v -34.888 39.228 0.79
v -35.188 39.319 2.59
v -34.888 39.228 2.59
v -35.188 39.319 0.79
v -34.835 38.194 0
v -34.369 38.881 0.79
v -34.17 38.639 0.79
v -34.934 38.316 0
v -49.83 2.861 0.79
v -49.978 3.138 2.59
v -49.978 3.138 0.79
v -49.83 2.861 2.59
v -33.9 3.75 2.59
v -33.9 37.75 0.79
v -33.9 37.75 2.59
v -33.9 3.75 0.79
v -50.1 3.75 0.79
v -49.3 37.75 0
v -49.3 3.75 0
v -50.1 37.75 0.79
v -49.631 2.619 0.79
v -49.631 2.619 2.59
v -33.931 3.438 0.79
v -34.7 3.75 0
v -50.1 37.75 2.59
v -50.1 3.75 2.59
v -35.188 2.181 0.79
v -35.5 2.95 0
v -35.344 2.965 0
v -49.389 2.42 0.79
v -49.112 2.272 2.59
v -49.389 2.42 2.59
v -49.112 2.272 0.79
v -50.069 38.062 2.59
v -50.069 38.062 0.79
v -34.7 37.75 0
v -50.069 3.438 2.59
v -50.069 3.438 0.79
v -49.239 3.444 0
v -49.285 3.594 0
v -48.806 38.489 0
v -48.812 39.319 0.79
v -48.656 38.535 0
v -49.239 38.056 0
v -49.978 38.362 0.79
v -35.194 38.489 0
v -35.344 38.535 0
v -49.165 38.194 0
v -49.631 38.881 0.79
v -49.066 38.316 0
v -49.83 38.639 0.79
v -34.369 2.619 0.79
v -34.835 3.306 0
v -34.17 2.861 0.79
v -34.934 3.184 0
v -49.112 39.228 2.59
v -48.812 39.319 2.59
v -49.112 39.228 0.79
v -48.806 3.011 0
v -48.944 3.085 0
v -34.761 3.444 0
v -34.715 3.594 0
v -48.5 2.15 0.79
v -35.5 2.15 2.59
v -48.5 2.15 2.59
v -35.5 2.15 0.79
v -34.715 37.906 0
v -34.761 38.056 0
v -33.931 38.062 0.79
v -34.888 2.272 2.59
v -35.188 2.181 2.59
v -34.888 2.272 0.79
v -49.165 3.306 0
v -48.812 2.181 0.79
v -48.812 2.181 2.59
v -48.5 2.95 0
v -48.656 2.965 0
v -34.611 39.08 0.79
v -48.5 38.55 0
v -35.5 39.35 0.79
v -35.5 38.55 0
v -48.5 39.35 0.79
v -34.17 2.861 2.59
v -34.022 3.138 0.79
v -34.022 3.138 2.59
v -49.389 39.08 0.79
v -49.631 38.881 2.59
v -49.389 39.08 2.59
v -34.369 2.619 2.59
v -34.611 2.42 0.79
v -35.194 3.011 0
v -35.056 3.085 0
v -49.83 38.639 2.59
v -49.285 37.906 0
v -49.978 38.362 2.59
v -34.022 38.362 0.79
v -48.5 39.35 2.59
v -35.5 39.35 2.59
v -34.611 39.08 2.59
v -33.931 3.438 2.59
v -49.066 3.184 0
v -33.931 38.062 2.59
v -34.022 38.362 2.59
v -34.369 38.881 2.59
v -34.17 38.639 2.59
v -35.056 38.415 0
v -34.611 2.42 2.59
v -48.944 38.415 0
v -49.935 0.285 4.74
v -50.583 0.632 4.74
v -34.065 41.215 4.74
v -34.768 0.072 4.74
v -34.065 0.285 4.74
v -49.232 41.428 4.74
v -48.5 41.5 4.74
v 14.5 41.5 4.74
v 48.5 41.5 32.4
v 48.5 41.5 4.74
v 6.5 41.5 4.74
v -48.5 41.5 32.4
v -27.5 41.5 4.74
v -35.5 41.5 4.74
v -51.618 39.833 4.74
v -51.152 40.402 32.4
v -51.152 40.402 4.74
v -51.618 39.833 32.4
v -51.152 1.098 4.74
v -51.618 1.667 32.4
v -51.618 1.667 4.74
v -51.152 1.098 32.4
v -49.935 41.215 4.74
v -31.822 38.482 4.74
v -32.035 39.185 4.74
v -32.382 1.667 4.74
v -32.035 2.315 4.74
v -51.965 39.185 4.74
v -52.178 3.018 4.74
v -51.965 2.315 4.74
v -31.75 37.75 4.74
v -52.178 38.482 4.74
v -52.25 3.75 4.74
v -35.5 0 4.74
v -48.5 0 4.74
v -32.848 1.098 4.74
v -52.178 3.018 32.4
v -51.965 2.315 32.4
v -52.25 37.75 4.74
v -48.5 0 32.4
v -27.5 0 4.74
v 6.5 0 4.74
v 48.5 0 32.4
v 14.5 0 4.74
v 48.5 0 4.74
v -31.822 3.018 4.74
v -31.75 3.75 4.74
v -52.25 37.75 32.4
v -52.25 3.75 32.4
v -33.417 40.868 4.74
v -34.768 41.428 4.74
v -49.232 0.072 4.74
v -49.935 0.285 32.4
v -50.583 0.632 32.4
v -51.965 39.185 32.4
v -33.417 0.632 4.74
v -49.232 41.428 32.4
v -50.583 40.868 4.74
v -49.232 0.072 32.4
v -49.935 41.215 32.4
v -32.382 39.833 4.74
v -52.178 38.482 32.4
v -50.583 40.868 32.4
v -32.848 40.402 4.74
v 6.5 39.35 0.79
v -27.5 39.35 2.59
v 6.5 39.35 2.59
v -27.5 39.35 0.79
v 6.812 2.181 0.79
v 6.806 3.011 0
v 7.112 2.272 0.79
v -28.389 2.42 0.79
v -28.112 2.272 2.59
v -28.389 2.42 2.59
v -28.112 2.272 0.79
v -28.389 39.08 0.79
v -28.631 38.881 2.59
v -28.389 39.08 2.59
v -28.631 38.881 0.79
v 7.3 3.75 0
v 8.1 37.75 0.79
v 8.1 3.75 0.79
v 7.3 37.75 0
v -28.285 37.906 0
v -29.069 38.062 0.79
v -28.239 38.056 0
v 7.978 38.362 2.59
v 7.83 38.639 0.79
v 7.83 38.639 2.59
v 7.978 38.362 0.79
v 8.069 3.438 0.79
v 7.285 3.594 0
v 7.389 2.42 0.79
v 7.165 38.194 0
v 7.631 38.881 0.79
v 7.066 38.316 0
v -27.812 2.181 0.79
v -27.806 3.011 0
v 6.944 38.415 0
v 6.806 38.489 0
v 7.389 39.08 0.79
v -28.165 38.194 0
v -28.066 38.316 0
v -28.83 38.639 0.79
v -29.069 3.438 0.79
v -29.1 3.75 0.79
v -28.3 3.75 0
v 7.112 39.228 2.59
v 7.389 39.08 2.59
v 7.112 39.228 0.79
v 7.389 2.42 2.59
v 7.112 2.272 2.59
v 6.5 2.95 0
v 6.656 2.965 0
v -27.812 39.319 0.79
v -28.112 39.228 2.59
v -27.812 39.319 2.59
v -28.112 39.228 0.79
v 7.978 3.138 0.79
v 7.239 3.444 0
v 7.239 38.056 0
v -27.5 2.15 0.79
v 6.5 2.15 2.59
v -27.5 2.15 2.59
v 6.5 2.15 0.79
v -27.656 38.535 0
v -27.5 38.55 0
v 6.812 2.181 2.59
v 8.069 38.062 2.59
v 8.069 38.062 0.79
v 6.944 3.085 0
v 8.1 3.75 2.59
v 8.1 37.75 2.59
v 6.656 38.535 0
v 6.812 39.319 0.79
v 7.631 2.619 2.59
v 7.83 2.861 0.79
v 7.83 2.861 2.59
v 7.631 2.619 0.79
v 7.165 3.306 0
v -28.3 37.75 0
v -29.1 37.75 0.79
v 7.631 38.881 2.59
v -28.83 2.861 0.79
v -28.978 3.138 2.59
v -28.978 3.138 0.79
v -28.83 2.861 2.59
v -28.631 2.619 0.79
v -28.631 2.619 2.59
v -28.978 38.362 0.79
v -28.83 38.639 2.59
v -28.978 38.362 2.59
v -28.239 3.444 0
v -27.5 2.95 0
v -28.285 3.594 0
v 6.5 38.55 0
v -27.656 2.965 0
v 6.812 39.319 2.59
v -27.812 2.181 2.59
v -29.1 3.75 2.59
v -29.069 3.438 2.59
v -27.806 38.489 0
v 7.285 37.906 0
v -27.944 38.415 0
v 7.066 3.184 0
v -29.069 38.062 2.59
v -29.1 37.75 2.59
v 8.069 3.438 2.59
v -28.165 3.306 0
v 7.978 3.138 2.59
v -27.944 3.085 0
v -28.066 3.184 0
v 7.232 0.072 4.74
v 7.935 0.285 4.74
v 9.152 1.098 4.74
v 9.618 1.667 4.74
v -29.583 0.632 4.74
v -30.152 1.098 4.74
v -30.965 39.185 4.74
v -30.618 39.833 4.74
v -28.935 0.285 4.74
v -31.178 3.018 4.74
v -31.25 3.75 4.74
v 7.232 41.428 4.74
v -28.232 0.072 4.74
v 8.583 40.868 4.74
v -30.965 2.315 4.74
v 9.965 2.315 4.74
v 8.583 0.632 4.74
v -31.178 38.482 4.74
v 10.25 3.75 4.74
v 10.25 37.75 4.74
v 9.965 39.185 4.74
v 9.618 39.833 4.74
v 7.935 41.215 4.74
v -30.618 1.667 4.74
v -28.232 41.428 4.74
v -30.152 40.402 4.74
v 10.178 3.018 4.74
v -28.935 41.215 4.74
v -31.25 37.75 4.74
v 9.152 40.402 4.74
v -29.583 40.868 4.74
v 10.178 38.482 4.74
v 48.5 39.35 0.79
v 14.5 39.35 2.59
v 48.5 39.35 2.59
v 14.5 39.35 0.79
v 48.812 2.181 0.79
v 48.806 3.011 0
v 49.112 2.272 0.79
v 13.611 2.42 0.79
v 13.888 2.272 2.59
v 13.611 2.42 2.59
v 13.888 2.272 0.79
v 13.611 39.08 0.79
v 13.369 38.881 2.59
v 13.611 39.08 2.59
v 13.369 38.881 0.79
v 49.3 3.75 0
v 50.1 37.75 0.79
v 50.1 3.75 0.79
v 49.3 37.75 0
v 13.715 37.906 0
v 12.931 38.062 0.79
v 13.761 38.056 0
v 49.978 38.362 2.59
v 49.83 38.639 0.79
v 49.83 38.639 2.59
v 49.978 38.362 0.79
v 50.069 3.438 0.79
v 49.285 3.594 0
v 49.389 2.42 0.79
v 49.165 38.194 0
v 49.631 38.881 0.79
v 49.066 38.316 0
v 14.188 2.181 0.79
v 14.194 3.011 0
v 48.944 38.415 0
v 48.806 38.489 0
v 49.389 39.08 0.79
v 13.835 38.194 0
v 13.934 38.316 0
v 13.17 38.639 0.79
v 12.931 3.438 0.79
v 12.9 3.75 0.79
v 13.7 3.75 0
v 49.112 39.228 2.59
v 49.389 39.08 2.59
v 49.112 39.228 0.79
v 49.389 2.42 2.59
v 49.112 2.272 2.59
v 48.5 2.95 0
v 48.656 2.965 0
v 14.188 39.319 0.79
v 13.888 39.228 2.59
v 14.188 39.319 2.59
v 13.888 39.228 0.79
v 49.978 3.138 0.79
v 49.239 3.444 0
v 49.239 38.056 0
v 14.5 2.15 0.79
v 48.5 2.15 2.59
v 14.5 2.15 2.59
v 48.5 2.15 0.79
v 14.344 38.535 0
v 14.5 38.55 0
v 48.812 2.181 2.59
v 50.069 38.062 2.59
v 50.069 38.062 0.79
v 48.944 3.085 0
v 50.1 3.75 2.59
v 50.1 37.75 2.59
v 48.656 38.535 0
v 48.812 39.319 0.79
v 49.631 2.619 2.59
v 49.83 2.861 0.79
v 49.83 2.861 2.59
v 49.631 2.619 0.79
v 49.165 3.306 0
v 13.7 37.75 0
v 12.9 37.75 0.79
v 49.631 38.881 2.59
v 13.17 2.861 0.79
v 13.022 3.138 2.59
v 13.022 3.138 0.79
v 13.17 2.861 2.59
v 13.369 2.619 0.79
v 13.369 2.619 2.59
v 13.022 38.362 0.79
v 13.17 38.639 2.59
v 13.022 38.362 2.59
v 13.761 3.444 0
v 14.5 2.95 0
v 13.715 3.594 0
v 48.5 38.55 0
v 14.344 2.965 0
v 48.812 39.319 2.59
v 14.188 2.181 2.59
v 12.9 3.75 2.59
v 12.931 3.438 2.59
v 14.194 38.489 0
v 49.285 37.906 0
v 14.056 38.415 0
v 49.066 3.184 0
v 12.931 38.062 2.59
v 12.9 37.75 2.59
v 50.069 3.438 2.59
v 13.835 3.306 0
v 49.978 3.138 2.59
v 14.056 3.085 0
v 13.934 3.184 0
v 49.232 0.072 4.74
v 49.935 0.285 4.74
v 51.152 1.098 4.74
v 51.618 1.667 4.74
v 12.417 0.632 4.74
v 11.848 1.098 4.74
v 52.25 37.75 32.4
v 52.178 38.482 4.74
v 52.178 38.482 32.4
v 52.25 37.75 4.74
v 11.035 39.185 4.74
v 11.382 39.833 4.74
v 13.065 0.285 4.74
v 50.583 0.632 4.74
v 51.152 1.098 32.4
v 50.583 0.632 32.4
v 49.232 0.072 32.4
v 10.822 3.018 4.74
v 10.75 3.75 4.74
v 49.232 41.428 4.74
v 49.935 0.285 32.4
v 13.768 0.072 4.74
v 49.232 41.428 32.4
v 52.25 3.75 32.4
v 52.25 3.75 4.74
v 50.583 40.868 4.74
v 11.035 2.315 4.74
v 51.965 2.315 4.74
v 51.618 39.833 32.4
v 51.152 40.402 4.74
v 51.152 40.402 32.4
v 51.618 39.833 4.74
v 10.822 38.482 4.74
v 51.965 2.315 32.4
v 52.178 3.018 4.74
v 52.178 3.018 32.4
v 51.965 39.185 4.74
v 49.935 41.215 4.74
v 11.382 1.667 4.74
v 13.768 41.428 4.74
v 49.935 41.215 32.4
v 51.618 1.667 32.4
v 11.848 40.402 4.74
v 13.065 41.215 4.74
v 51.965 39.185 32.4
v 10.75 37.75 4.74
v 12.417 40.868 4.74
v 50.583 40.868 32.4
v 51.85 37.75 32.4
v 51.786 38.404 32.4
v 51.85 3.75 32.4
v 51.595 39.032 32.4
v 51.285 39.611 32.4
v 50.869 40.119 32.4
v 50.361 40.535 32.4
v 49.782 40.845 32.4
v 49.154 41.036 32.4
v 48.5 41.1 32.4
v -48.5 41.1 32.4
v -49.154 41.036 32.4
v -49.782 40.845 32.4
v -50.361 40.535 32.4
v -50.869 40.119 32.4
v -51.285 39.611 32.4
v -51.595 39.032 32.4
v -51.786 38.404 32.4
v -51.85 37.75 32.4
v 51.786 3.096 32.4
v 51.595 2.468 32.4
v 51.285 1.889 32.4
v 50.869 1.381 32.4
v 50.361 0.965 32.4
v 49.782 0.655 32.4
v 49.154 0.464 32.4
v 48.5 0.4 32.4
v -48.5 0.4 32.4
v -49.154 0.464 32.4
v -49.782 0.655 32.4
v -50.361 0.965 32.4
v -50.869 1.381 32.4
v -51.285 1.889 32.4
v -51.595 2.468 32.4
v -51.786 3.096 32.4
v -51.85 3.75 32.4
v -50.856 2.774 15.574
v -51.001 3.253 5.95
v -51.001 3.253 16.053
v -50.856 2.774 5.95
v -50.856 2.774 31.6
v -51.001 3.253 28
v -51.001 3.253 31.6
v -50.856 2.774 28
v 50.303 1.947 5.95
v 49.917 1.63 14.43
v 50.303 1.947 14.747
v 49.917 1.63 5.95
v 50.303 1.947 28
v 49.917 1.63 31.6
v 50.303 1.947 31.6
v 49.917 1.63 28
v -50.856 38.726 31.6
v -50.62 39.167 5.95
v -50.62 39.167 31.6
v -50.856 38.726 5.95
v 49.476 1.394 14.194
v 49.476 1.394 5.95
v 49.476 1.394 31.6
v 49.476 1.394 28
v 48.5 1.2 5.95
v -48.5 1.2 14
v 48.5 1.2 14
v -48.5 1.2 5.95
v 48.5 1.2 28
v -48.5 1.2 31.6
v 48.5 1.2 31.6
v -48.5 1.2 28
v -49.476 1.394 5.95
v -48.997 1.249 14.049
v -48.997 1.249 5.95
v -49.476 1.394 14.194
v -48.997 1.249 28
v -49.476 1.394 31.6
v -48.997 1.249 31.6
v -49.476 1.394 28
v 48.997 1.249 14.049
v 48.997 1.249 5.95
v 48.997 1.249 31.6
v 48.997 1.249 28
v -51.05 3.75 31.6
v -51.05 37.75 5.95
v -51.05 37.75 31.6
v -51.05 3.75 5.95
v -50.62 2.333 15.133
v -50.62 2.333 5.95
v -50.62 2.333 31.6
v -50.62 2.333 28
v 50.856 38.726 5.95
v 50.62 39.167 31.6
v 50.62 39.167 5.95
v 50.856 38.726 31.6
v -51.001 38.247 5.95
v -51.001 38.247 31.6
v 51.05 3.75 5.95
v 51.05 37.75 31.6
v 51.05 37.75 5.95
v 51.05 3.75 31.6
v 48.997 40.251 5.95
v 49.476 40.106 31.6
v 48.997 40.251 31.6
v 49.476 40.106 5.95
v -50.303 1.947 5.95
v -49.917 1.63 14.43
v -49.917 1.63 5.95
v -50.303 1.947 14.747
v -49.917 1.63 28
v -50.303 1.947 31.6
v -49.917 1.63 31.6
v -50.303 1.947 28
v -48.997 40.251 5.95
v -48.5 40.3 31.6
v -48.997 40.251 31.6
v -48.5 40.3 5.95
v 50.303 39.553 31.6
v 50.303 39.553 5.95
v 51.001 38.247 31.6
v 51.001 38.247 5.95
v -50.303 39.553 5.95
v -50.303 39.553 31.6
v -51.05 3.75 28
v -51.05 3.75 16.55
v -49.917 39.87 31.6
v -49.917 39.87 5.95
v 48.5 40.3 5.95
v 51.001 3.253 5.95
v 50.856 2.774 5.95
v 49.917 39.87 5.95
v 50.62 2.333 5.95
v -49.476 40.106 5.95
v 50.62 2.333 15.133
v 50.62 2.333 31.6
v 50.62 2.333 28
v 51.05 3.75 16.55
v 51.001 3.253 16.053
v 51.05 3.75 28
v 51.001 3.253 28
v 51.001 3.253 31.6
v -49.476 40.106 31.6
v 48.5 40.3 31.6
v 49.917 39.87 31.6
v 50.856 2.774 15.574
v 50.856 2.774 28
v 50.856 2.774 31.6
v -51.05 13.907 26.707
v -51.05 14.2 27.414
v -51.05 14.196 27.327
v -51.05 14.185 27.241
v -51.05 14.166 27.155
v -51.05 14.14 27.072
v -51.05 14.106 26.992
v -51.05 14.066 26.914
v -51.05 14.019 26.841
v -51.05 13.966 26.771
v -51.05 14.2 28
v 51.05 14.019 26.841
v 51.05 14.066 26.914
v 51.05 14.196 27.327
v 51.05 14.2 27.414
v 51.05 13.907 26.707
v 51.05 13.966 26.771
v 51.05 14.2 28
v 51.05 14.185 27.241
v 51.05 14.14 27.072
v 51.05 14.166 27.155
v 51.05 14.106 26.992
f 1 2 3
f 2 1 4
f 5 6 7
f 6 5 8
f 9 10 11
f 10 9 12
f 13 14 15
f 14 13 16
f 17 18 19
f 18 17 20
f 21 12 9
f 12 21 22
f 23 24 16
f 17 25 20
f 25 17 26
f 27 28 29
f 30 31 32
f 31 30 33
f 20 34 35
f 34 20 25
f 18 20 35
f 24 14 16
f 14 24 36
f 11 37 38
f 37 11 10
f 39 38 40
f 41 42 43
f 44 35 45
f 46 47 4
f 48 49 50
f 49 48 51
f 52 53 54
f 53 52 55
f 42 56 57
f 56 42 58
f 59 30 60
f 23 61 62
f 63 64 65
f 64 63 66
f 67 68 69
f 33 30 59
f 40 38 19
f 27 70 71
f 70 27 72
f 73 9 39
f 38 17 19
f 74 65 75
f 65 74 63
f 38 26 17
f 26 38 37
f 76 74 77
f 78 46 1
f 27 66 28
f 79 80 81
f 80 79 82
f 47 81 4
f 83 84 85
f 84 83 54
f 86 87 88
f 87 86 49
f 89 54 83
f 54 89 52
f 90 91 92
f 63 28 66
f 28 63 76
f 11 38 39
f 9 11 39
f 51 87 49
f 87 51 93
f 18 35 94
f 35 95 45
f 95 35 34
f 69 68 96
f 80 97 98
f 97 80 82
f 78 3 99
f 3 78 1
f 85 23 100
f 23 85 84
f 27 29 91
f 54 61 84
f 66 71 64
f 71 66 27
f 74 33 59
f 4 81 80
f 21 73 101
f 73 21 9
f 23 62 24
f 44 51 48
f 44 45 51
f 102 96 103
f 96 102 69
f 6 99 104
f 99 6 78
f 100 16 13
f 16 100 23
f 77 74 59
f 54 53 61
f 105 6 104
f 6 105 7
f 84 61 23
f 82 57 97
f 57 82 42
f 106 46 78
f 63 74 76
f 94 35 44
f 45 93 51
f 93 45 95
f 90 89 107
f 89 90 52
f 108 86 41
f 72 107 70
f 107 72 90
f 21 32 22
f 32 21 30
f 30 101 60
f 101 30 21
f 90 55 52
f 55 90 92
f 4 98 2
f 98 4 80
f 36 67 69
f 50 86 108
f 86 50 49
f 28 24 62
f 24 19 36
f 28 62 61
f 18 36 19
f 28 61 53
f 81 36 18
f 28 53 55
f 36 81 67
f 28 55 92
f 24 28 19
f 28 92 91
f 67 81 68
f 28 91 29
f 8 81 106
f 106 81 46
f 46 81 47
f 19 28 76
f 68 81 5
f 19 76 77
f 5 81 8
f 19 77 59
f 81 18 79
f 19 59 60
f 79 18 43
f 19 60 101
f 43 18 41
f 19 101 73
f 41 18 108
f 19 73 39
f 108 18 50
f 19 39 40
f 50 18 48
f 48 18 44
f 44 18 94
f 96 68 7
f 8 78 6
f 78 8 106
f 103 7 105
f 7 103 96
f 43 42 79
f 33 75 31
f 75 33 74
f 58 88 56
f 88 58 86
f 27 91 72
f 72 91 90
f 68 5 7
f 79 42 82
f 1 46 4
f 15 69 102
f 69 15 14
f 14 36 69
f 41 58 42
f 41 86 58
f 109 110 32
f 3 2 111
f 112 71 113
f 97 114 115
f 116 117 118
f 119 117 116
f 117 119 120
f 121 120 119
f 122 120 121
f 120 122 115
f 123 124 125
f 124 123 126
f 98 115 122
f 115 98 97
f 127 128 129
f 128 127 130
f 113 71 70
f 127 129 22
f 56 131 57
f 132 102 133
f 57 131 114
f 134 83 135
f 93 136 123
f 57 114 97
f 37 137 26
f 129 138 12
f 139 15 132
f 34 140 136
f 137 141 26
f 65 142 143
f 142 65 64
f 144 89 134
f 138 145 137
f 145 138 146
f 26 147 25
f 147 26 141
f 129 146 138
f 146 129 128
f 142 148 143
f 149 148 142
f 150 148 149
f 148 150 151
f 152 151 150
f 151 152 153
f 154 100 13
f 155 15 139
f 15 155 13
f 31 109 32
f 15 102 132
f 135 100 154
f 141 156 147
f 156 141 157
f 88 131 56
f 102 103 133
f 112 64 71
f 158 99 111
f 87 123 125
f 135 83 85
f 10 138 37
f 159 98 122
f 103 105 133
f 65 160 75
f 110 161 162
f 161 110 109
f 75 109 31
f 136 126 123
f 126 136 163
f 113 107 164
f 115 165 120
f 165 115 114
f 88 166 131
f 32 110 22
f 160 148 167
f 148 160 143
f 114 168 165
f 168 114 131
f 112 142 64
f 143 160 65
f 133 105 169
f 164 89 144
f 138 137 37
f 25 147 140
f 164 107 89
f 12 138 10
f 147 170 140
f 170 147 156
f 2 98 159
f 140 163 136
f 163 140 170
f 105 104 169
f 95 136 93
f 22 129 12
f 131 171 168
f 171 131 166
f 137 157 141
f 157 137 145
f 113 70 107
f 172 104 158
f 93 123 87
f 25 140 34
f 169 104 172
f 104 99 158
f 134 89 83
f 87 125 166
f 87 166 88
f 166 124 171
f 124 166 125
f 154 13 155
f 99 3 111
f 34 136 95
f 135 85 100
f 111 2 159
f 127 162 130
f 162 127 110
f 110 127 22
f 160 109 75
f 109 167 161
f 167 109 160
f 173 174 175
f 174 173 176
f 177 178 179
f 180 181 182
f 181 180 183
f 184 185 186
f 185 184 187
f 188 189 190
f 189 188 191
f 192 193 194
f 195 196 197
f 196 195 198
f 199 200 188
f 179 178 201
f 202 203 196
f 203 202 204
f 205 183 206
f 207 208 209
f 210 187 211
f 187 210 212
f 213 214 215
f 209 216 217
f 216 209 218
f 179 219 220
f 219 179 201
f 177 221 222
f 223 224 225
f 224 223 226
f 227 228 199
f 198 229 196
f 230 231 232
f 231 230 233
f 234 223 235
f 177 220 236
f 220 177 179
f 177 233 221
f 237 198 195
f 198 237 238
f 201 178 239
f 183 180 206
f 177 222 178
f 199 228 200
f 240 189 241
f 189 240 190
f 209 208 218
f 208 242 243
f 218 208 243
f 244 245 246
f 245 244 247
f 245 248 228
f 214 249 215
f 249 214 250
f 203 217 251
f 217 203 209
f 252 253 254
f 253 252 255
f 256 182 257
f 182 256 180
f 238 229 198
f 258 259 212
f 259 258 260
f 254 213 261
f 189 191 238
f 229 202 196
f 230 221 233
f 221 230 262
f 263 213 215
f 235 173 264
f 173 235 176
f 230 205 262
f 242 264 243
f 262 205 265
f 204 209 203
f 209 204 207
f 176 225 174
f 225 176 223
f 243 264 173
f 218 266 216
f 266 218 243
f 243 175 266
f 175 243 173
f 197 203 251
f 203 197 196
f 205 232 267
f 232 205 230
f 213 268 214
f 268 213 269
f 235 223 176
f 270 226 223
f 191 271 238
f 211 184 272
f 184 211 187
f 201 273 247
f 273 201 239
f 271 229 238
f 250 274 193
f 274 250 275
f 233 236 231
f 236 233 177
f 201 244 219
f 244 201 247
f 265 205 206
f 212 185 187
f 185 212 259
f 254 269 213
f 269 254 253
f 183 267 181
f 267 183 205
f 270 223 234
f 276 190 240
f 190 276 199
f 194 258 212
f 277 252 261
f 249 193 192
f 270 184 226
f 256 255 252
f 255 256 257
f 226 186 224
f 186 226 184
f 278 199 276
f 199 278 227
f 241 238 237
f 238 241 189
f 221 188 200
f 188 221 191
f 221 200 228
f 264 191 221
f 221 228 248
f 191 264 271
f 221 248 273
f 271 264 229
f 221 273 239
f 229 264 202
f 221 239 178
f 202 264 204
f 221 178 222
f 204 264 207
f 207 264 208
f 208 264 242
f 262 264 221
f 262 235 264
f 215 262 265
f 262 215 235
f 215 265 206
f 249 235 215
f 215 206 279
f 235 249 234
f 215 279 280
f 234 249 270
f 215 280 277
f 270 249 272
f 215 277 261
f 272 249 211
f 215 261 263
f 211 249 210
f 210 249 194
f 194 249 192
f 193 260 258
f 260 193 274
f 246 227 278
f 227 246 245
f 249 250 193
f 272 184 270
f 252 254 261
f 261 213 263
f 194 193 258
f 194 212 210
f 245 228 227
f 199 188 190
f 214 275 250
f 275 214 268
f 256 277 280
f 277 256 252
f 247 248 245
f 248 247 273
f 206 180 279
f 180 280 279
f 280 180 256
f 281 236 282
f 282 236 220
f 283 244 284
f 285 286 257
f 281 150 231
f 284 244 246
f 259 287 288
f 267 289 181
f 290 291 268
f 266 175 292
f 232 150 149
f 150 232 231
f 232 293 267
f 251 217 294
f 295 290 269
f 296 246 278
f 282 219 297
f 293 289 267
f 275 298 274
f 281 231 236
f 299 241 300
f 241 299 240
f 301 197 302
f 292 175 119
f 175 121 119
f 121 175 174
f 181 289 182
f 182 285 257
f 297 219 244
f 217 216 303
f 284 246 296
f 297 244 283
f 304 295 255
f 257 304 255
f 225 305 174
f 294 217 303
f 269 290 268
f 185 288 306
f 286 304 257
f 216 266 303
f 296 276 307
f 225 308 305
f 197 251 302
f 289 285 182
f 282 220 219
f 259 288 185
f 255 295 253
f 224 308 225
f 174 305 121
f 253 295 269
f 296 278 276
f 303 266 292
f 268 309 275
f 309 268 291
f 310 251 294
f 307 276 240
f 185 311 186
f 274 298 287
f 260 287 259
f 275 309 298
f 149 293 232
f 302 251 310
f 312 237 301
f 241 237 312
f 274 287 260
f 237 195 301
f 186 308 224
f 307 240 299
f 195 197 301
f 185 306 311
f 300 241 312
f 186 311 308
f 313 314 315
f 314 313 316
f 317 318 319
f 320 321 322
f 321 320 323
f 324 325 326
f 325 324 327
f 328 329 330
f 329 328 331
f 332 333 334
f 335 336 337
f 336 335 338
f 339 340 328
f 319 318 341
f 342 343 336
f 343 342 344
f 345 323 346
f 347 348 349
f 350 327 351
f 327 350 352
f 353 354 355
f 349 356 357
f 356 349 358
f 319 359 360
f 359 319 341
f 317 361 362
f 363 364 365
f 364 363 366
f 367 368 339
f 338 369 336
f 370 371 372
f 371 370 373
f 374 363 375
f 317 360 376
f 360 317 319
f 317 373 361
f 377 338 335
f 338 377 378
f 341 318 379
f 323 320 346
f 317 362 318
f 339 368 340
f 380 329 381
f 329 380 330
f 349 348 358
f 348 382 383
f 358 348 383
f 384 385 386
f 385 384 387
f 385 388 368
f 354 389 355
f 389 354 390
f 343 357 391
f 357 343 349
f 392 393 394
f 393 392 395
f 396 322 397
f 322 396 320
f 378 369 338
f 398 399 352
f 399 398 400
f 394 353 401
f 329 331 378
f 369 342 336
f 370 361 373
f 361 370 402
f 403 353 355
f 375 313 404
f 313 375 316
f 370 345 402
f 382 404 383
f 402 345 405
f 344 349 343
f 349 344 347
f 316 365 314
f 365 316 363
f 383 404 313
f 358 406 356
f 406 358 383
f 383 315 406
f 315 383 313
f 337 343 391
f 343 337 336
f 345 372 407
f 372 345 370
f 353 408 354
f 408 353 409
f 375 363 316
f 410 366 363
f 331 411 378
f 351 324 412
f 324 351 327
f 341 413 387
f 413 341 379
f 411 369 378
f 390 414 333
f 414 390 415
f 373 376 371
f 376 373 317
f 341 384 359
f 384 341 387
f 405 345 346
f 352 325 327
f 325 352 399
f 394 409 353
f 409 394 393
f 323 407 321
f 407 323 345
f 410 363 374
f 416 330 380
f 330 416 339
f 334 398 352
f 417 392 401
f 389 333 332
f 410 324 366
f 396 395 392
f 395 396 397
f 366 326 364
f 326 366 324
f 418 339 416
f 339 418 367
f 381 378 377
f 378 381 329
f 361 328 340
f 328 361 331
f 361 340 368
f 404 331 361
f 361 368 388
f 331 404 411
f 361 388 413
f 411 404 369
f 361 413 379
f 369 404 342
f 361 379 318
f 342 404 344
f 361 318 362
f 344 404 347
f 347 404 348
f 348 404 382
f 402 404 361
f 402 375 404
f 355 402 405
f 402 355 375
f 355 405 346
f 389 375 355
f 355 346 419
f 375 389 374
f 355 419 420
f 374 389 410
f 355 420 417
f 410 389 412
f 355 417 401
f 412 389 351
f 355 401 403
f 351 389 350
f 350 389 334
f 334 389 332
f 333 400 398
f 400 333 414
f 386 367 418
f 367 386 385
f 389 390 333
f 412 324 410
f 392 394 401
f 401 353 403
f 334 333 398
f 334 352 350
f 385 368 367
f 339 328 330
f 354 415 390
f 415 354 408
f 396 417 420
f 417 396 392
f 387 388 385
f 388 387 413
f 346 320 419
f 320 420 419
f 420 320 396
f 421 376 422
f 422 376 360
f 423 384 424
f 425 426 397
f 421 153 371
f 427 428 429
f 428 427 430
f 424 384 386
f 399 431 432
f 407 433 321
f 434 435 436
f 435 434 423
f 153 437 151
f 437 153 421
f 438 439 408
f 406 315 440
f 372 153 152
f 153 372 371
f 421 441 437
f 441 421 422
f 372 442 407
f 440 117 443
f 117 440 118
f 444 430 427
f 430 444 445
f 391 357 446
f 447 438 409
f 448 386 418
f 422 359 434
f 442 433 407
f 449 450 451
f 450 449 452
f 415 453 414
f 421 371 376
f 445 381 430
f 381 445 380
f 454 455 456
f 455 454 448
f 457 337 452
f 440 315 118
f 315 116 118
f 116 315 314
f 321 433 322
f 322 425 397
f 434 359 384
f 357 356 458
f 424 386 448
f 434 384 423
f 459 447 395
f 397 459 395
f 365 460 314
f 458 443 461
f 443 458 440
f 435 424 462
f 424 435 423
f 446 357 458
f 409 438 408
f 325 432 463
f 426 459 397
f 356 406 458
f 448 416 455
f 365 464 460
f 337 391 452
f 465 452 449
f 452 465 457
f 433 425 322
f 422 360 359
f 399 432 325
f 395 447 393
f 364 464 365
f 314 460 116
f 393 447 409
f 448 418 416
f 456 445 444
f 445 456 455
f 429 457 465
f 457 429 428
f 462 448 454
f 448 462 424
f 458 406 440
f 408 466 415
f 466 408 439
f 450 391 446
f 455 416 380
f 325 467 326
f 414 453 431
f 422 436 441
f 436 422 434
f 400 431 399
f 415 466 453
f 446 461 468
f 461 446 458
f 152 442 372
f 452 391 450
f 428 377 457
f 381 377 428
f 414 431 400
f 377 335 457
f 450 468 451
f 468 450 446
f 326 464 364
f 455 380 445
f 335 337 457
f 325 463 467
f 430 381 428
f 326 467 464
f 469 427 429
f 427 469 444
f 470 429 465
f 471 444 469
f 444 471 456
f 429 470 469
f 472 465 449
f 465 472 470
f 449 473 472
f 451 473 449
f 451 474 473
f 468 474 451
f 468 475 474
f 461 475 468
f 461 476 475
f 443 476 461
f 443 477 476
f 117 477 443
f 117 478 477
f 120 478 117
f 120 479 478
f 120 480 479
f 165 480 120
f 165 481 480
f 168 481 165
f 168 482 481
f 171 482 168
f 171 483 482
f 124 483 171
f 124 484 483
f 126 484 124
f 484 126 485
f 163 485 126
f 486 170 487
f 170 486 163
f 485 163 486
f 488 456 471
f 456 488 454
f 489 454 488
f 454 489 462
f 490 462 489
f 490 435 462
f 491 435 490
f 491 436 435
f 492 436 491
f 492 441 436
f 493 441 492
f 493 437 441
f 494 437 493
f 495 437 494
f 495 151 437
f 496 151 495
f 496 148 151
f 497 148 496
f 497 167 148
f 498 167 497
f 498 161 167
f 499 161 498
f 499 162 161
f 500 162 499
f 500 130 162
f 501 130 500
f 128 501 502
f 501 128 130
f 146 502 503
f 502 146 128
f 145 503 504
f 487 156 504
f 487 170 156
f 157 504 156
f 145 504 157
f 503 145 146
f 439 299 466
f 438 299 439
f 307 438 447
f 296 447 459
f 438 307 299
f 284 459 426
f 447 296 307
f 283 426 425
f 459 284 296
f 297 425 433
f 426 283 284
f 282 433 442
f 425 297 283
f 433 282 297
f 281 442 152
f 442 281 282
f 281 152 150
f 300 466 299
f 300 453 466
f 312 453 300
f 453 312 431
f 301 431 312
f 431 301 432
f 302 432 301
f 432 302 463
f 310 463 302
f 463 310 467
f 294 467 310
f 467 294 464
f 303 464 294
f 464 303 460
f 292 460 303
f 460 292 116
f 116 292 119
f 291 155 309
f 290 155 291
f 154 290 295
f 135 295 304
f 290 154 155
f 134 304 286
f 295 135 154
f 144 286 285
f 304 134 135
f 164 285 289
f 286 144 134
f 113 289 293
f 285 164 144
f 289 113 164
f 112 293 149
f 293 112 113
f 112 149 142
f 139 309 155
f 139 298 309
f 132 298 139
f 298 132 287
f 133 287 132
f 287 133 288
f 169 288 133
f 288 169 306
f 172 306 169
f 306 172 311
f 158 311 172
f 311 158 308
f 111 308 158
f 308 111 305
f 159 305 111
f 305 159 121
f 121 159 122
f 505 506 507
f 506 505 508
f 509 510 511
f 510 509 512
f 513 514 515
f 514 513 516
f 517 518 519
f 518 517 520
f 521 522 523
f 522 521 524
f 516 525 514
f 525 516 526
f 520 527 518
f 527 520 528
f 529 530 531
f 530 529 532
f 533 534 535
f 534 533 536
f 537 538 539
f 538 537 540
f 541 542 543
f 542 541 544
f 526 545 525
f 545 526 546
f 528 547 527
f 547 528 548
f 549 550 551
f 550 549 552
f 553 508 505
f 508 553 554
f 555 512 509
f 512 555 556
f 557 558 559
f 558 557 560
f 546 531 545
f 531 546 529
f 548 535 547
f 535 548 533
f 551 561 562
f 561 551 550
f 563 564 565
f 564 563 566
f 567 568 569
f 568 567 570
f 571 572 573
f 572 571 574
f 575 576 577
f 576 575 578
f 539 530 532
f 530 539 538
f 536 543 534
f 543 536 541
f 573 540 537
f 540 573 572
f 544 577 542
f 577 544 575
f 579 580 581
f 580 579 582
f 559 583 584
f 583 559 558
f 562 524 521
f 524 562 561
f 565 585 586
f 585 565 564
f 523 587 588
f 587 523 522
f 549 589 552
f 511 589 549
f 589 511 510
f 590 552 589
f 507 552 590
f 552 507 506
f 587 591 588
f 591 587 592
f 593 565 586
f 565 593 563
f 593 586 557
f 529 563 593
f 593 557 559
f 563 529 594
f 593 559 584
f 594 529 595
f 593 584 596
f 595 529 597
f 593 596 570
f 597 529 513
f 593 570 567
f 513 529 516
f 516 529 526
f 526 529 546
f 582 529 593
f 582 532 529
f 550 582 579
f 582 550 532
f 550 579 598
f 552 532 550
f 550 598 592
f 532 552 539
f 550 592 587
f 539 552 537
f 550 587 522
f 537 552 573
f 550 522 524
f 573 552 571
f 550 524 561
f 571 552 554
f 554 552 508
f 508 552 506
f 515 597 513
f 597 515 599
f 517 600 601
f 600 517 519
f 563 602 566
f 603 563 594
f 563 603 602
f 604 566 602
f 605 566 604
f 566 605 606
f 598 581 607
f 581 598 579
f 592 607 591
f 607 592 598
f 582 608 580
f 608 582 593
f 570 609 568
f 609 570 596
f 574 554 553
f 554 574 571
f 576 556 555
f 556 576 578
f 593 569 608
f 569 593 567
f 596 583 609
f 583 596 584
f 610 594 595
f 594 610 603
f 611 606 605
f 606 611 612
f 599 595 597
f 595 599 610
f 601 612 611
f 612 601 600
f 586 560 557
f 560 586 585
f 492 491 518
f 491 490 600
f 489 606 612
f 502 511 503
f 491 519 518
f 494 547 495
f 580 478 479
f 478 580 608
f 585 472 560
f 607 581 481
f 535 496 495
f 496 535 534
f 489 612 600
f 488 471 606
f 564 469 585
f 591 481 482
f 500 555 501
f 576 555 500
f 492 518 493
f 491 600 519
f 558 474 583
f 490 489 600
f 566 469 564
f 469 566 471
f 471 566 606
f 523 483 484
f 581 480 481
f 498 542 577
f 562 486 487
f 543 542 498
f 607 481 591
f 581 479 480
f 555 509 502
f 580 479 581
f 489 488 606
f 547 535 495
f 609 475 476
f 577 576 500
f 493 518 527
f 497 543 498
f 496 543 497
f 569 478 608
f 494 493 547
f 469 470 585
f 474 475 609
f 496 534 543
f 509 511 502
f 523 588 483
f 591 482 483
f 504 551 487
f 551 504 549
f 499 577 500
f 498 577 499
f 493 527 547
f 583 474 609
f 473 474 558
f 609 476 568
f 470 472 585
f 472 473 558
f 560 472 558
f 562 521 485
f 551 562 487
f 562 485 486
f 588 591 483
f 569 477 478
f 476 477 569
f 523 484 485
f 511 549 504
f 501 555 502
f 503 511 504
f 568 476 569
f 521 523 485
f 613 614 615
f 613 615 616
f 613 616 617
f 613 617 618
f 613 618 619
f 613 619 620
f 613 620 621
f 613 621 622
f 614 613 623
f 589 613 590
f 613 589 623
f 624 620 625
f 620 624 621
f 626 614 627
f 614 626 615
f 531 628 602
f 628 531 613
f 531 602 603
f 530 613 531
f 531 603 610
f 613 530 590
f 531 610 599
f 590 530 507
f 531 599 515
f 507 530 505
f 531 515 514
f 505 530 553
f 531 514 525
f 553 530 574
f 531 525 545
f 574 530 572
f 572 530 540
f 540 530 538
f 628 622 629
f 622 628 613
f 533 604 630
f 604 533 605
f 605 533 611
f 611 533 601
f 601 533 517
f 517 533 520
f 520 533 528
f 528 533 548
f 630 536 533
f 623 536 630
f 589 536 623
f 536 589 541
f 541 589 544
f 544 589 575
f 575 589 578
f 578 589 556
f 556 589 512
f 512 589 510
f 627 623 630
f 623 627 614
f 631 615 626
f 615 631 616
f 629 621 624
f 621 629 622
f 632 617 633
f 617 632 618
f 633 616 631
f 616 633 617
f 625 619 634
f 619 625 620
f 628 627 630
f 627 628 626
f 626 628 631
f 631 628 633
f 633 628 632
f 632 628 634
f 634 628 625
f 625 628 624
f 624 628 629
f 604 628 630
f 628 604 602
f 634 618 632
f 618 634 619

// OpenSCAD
// file: ../../../modules/gridfinity.scad
// Gridfinity ベースプレートの共有 module。
// 寸法は Gridfinity 仕様 (Zack Freedman) の baseplate 輪郭に従う:
//   ピッチ 42、ソケット上端開口 41.5 (角 R4)、上から 45° 面取り 2.15 →
//   垂直 1.8 (37.2 角・R1.85) → 45° 面取り 0.7 → 底 35.8 角 (R1.15)。
//   ソケット深さ = 2.15 + 1.8 + 0.7 = 4.65。
//
// 座標系: X が列方向 (中央が 0)、Y が行方向 (板の前端が 0)、Z=0 が板の底面。
// 板の外形は grid とは独立に rim で与えるので、grid より大きい板 (縁付き) を
// 作れる。ソケットは rim=[left, right, front, back] の内側へ 42 ピッチで並ぶ。

gf_pitch = 42;
gf_socket_top = 41.5; // 上端開口
gf_socket_mid = 37.2; // 垂直部
gf_socket_bot = 35.8; // 底
gf_socket_r_top = 4;
gf_socket_r_mid = 1.85;
gf_socket_r_bot = 1.15;
gf_chamfer_top = 2.15;
gf_wall_h = 1.8;
gf_chamfer_bot = 0.7;
gf_socket_depth = gf_chamfer_top + gf_wall_h + gf_chamfer_bot; // 4.65
gf_fn = 32;
gf_eps = 0.01; // hull 用の薄板の厚さ
gf_over = 0.5; // 切削の抜き代

// 角丸正方形または矩形 (w は一辺、または [幅, 奥行き]、角 R)
module
gf_rounded_square(w, r)
{
    offset(r = r, $fn = gf_fn)
        square(is_list(w) ? w - [ 2 * r, 2 * r ] : w - 2 * r, center = true);
}

// 厚さ gf_eps の角丸正方形の薄板を z に置く (hull の骨)
module
gf_slab(w, r, z)
{
    translate([ 0, 0, z ]) linear_extrude(gf_eps) gf_rounded_square(w, r);
}

// ソケット1個の切削体。z=0 がソケットの底 (床の天面)、+Z へ 4.65 で天面に出る。
// clearance は嵌合の逃げで、輪郭を全周へ clearance だけ外へ出す (幅 +2c、角 R
// +c)。pitch_x は X 方向のセル幅。端数でも角 R と面取りの寸法を保つ。
module
gf_socket_cut(clearance = 0, pitch_x = gf_pitch)
{
    z1 = gf_chamfer_bot;
    z2 = z1 + gf_wall_h;
    z3 = gf_socket_depth;
    c = clearance;
    assert(pitch_x > gf_pitch - gf_socket_top + 2 * gf_socket_r_top,
           "Cell width is too small for the socket corner radius");
    delta = [ pitch_x - gf_pitch, 0 ];
    bot = [ gf_socket_bot + 2 * c, gf_socket_bot + 2 * c ] + delta;
    mid = [ gf_socket_mid + 2 * c, gf_socket_mid + 2 * c ] + delta;
    top = [ gf_socket_top + 2 * c, gf_socket_top + 2 * c ] + delta;
    hull()
    {
        gf_slab(bot, gf_socket_r_bot + c, 0);
        gf_slab(mid, gf_socket_r_mid + c, z1 - gf_eps);
    }
    hull()
    {
        gf_slab(mid, gf_socket_r_mid + c, z1 - gf_eps);
        gf_slab(mid, gf_socket_r_mid + c, z2 - gf_eps);
    }
    hull()
    {
        gf_slab(mid, gf_socket_r_mid + c, z2 - gf_eps);
        gf_slab(top, gf_socket_r_top + c, z3 - gf_eps);
    }
    // 天面より上へ抜く (天面と同一平面の退化した面を残さない)
    gf_slab(top, gf_socket_r_top + c, z3 - gf_eps);
    translate([ 0, 0, z3 - gf_eps ]) linear_extrude(gf_over + gf_eps)
        gf_rounded_square(top, gf_socket_r_top + c);
}

// ベースプレート。cols x rows のソケットを床 floor_t の上に彫る。
// rim = [left, right, front, back] はソケット列の外側に残す縁の幅。
// 板の幅 = cols*42 + left + right、奥行き = rows*42 + front + back。
// cols の端数は左端の細幅セルになる。rows は正の整数。
// clearance はソケットの嵌合の逃げ (gf_socket_cut を参照)。
module
gf_baseplate(cols, rows, rim = [ 0, 0, 0, 0 ], floor_t = 1, clearance = 0)
{
    grid_w = cols * gf_pitch;
    grid_d = rows * gf_pitch;
    plate_w = grid_w + rim[0] + rim[1];
    plate_d = grid_d + rim[2] + rim[3];
    x0 = -plate_w / 2 + rim[0]; // ソケット列の左端
    first_pitch = grid_w - (ceil(cols) - 1) * gf_pitch;
    difference()
    {
        translate([ -plate_w / 2, 0, 0 ])
            cube([ plate_w, plate_d, floor_t + gf_socket_depth ]);
        for (c = [0:ceil(cols) - 1], r = [0:rows - 1])
            translate([
                x0 + (c == 0 ? first_pitch / 2
                             : first_pitch + (c - 0.5) * gf_pitch),
                rim[2] + (r + 0.5) * gf_pitch,
                floor_t
            ]) gf_socket_cut(clearance, c == 0 ? first_pitch : gf_pitch);
    }
}
// file: ../../../modules/gridfinity_bins.scad
include <gridfinity_bin.scad>

// assets/gridfinity-bin/ の bin 群の共通値と、サイズ 3 引数の払い出し口。
// 単体では何も描かない。設計の経緯と確定値は
// ledger/designs/gridfinity-bin-4u.md が正本。
// 通常binは4U/9U、X={1,1.5,2,2.5,3} × Y={1,2,3,4,5,5.5}。
// 両軸に端数を持つ組み合わせはassetに置かない（各高さ28種）。
// Xが横、Yがラベルの壁から奥、unitsが高さ（7mm単位）。
wall = 1.2;    // 0.4 ノズル 3 本
floor_t = 1.2; // 底 (4.75) の上に載せる床。床の天面 z = 5.95
label_d = 13;  // 12mm 幅のラベルシールを貼る天板の張り出し
label_t = 1; // 天板の厚さ (user 指定)。下は 45° の無垢のくさび
label_r = 1; // 天板の先端と 45° 面の境目の R (user 指定)
// カードケース (goods/card_case_2x3x4u.scad) の値。カードは ISO/IEC 7810 ID-1 (85.6 × 54 ×
// 0.76、隅 R3) で、長辺を Y (rows 方向) に寝かせ、X 中央・手前の壁から 10 奥に置く。ポケットは
// カードより 1 大きい (片側 0.5)。右奥のマスは壁の内面まで抜き、床と底を外形に平行な 45° の窪みにする。
// ポケットの左右の埋めの天面 (幅 13.05) が 12mm のラベルを貼る帯。ポケットと穴の交点の
// 縦エッジは丸める (開口の上縁は丸めない: 壁を上端まで垂直に保ち、収まる枚数を減らさない)
card_w = 54;    // カードの短辺 (X)。user 指定「高さ 54」
card_d = 85.6;  // カードの長辺 (Y)。user 指定「幅 85.6」
card_clear = 1; // ポケットの余裕 (user 指定「+1mm」)
// ポケットの手前の辺の、手前の壁の内面からの距離 (user 指定「10mm」)
card_off = 10;
// ポケットの平面の隅 R (user 指定「角の丸み 3mm」。ID-1 の隅は 2.88..3.48)
card_r = 3;
// ポケットと穴が交わる所の、埋めの凸の縦エッジの R (指の当たる角)
card_edge_r = 2;
recess_skin = floor_t + 1.75; // 窪みの床 z (底の皮)。user 指定「壁厚と同じ 1.2 は過剰、1.75 返す」

function bin_contract(cols, rows, units) = str("CONTRACT units=",
                                               units,
                                               " pitch=",
                                               gf_pitch,
                                               " outer=",
                                               gfb_outer,
                                               " h=",
                                               units* gfb_unit,
                                               " lip=",
                                               gfb_lip_h,
                                               " base=",
                                               gfb_base_bot,
                                               "/",
                                               gfb_base_mid,
                                               "/",
                                               gfb_outer,
                                               " base_h=",
                                               gfb_base_h,
                                               " wall=",
                                               wall,
                                               " floor_top=",
                                               gfb_base_h + floor_t,
                                               " label=",
                                               label_d,
                                               "x",
                                               label_t,
                                               " wedge=45 fillet=",
                                               label_r,
                                               " bin=",
                                               cols,
                                               "x",
                                               rows,
                                               " size=",
                                               cols* gf_pitch - 0.5,
                                               "x",
                                               rows* gf_pitch - 0.5);

// (cols, rows, units) でラベル付き bin を払い出す。例: gridfinity_bin(2, 4, 4)
module
gridfinity_bin(cols, rows, units = 4)
{
    echo(bin_contract(cols, rows, units));
    gfb_bin(cols, rows, units, wall, floor_t, label_d, label_t, label_r);
}

function card_contract(cols, rows, units) = str("CONTRACT card units=",
                                                units,
                                                " bin=",
                                                cols,
                                                "x",
                                                rows,
                                                " size=",
                                                cols* gf_pitch - 0.5,
                                                "x",
                                                rows* gf_pitch - 0.5,
                                                " h=",
                                                units* gfb_unit,
                                                " lip=",
                                                gfb_lip_h,
                                                " floor_top=",
                                                gfb_base_h + floor_t,
                                                " card=",
                                                card_w,
                                                "x",
                                                card_d,
                                                " pocket=",
                                                card_w + card_clear,
                                                "x",
                                                card_d + card_clear,
                                                " at=",
                                                -(card_w + card_clear) / 2,
                                                ",",
                                                wall + card_off,
                                                " hole=",
                                                (cols - 1) / 2 * gf_pitch - gfb_outer / 2,
                                                ",",
                                                (rows - 0.5) * gf_pitch - 0.25 - gfb_outer / 2,
                                                " hole_r=",
                                                gfb_outer_r - wall,
                                                " recess=",
                                                gfb_outer - 2 * wall,
                                                "/",
                                                gfb_base_mid - 2 * wall,
                                                " recess_floor=",
                                                recess_skin,
                                                " r=",
                                                card_r,
                                                " edge_r=",
                                                card_edge_r);

// (cols, rows, units) でカードケースを払い出す。例: gridfinity_card_case(2, 3, 4)
module
gridfinity_card_case(cols, rows, units = 4)
{
    echo(card_contract(cols, rows, units));
    gfb_card_case(cols,
                  rows,
                  units,
                  wall,
                  floor_t,
                  [ card_w, card_d ],
                  card_clear,
                  card_off,
                  card_r,
                  recess_skin,
                  card_edge_r);
}
// main file
include <../../../modules/gridfinity_bins.scad>

gridfinity_bin(2.5, 1, 4);
